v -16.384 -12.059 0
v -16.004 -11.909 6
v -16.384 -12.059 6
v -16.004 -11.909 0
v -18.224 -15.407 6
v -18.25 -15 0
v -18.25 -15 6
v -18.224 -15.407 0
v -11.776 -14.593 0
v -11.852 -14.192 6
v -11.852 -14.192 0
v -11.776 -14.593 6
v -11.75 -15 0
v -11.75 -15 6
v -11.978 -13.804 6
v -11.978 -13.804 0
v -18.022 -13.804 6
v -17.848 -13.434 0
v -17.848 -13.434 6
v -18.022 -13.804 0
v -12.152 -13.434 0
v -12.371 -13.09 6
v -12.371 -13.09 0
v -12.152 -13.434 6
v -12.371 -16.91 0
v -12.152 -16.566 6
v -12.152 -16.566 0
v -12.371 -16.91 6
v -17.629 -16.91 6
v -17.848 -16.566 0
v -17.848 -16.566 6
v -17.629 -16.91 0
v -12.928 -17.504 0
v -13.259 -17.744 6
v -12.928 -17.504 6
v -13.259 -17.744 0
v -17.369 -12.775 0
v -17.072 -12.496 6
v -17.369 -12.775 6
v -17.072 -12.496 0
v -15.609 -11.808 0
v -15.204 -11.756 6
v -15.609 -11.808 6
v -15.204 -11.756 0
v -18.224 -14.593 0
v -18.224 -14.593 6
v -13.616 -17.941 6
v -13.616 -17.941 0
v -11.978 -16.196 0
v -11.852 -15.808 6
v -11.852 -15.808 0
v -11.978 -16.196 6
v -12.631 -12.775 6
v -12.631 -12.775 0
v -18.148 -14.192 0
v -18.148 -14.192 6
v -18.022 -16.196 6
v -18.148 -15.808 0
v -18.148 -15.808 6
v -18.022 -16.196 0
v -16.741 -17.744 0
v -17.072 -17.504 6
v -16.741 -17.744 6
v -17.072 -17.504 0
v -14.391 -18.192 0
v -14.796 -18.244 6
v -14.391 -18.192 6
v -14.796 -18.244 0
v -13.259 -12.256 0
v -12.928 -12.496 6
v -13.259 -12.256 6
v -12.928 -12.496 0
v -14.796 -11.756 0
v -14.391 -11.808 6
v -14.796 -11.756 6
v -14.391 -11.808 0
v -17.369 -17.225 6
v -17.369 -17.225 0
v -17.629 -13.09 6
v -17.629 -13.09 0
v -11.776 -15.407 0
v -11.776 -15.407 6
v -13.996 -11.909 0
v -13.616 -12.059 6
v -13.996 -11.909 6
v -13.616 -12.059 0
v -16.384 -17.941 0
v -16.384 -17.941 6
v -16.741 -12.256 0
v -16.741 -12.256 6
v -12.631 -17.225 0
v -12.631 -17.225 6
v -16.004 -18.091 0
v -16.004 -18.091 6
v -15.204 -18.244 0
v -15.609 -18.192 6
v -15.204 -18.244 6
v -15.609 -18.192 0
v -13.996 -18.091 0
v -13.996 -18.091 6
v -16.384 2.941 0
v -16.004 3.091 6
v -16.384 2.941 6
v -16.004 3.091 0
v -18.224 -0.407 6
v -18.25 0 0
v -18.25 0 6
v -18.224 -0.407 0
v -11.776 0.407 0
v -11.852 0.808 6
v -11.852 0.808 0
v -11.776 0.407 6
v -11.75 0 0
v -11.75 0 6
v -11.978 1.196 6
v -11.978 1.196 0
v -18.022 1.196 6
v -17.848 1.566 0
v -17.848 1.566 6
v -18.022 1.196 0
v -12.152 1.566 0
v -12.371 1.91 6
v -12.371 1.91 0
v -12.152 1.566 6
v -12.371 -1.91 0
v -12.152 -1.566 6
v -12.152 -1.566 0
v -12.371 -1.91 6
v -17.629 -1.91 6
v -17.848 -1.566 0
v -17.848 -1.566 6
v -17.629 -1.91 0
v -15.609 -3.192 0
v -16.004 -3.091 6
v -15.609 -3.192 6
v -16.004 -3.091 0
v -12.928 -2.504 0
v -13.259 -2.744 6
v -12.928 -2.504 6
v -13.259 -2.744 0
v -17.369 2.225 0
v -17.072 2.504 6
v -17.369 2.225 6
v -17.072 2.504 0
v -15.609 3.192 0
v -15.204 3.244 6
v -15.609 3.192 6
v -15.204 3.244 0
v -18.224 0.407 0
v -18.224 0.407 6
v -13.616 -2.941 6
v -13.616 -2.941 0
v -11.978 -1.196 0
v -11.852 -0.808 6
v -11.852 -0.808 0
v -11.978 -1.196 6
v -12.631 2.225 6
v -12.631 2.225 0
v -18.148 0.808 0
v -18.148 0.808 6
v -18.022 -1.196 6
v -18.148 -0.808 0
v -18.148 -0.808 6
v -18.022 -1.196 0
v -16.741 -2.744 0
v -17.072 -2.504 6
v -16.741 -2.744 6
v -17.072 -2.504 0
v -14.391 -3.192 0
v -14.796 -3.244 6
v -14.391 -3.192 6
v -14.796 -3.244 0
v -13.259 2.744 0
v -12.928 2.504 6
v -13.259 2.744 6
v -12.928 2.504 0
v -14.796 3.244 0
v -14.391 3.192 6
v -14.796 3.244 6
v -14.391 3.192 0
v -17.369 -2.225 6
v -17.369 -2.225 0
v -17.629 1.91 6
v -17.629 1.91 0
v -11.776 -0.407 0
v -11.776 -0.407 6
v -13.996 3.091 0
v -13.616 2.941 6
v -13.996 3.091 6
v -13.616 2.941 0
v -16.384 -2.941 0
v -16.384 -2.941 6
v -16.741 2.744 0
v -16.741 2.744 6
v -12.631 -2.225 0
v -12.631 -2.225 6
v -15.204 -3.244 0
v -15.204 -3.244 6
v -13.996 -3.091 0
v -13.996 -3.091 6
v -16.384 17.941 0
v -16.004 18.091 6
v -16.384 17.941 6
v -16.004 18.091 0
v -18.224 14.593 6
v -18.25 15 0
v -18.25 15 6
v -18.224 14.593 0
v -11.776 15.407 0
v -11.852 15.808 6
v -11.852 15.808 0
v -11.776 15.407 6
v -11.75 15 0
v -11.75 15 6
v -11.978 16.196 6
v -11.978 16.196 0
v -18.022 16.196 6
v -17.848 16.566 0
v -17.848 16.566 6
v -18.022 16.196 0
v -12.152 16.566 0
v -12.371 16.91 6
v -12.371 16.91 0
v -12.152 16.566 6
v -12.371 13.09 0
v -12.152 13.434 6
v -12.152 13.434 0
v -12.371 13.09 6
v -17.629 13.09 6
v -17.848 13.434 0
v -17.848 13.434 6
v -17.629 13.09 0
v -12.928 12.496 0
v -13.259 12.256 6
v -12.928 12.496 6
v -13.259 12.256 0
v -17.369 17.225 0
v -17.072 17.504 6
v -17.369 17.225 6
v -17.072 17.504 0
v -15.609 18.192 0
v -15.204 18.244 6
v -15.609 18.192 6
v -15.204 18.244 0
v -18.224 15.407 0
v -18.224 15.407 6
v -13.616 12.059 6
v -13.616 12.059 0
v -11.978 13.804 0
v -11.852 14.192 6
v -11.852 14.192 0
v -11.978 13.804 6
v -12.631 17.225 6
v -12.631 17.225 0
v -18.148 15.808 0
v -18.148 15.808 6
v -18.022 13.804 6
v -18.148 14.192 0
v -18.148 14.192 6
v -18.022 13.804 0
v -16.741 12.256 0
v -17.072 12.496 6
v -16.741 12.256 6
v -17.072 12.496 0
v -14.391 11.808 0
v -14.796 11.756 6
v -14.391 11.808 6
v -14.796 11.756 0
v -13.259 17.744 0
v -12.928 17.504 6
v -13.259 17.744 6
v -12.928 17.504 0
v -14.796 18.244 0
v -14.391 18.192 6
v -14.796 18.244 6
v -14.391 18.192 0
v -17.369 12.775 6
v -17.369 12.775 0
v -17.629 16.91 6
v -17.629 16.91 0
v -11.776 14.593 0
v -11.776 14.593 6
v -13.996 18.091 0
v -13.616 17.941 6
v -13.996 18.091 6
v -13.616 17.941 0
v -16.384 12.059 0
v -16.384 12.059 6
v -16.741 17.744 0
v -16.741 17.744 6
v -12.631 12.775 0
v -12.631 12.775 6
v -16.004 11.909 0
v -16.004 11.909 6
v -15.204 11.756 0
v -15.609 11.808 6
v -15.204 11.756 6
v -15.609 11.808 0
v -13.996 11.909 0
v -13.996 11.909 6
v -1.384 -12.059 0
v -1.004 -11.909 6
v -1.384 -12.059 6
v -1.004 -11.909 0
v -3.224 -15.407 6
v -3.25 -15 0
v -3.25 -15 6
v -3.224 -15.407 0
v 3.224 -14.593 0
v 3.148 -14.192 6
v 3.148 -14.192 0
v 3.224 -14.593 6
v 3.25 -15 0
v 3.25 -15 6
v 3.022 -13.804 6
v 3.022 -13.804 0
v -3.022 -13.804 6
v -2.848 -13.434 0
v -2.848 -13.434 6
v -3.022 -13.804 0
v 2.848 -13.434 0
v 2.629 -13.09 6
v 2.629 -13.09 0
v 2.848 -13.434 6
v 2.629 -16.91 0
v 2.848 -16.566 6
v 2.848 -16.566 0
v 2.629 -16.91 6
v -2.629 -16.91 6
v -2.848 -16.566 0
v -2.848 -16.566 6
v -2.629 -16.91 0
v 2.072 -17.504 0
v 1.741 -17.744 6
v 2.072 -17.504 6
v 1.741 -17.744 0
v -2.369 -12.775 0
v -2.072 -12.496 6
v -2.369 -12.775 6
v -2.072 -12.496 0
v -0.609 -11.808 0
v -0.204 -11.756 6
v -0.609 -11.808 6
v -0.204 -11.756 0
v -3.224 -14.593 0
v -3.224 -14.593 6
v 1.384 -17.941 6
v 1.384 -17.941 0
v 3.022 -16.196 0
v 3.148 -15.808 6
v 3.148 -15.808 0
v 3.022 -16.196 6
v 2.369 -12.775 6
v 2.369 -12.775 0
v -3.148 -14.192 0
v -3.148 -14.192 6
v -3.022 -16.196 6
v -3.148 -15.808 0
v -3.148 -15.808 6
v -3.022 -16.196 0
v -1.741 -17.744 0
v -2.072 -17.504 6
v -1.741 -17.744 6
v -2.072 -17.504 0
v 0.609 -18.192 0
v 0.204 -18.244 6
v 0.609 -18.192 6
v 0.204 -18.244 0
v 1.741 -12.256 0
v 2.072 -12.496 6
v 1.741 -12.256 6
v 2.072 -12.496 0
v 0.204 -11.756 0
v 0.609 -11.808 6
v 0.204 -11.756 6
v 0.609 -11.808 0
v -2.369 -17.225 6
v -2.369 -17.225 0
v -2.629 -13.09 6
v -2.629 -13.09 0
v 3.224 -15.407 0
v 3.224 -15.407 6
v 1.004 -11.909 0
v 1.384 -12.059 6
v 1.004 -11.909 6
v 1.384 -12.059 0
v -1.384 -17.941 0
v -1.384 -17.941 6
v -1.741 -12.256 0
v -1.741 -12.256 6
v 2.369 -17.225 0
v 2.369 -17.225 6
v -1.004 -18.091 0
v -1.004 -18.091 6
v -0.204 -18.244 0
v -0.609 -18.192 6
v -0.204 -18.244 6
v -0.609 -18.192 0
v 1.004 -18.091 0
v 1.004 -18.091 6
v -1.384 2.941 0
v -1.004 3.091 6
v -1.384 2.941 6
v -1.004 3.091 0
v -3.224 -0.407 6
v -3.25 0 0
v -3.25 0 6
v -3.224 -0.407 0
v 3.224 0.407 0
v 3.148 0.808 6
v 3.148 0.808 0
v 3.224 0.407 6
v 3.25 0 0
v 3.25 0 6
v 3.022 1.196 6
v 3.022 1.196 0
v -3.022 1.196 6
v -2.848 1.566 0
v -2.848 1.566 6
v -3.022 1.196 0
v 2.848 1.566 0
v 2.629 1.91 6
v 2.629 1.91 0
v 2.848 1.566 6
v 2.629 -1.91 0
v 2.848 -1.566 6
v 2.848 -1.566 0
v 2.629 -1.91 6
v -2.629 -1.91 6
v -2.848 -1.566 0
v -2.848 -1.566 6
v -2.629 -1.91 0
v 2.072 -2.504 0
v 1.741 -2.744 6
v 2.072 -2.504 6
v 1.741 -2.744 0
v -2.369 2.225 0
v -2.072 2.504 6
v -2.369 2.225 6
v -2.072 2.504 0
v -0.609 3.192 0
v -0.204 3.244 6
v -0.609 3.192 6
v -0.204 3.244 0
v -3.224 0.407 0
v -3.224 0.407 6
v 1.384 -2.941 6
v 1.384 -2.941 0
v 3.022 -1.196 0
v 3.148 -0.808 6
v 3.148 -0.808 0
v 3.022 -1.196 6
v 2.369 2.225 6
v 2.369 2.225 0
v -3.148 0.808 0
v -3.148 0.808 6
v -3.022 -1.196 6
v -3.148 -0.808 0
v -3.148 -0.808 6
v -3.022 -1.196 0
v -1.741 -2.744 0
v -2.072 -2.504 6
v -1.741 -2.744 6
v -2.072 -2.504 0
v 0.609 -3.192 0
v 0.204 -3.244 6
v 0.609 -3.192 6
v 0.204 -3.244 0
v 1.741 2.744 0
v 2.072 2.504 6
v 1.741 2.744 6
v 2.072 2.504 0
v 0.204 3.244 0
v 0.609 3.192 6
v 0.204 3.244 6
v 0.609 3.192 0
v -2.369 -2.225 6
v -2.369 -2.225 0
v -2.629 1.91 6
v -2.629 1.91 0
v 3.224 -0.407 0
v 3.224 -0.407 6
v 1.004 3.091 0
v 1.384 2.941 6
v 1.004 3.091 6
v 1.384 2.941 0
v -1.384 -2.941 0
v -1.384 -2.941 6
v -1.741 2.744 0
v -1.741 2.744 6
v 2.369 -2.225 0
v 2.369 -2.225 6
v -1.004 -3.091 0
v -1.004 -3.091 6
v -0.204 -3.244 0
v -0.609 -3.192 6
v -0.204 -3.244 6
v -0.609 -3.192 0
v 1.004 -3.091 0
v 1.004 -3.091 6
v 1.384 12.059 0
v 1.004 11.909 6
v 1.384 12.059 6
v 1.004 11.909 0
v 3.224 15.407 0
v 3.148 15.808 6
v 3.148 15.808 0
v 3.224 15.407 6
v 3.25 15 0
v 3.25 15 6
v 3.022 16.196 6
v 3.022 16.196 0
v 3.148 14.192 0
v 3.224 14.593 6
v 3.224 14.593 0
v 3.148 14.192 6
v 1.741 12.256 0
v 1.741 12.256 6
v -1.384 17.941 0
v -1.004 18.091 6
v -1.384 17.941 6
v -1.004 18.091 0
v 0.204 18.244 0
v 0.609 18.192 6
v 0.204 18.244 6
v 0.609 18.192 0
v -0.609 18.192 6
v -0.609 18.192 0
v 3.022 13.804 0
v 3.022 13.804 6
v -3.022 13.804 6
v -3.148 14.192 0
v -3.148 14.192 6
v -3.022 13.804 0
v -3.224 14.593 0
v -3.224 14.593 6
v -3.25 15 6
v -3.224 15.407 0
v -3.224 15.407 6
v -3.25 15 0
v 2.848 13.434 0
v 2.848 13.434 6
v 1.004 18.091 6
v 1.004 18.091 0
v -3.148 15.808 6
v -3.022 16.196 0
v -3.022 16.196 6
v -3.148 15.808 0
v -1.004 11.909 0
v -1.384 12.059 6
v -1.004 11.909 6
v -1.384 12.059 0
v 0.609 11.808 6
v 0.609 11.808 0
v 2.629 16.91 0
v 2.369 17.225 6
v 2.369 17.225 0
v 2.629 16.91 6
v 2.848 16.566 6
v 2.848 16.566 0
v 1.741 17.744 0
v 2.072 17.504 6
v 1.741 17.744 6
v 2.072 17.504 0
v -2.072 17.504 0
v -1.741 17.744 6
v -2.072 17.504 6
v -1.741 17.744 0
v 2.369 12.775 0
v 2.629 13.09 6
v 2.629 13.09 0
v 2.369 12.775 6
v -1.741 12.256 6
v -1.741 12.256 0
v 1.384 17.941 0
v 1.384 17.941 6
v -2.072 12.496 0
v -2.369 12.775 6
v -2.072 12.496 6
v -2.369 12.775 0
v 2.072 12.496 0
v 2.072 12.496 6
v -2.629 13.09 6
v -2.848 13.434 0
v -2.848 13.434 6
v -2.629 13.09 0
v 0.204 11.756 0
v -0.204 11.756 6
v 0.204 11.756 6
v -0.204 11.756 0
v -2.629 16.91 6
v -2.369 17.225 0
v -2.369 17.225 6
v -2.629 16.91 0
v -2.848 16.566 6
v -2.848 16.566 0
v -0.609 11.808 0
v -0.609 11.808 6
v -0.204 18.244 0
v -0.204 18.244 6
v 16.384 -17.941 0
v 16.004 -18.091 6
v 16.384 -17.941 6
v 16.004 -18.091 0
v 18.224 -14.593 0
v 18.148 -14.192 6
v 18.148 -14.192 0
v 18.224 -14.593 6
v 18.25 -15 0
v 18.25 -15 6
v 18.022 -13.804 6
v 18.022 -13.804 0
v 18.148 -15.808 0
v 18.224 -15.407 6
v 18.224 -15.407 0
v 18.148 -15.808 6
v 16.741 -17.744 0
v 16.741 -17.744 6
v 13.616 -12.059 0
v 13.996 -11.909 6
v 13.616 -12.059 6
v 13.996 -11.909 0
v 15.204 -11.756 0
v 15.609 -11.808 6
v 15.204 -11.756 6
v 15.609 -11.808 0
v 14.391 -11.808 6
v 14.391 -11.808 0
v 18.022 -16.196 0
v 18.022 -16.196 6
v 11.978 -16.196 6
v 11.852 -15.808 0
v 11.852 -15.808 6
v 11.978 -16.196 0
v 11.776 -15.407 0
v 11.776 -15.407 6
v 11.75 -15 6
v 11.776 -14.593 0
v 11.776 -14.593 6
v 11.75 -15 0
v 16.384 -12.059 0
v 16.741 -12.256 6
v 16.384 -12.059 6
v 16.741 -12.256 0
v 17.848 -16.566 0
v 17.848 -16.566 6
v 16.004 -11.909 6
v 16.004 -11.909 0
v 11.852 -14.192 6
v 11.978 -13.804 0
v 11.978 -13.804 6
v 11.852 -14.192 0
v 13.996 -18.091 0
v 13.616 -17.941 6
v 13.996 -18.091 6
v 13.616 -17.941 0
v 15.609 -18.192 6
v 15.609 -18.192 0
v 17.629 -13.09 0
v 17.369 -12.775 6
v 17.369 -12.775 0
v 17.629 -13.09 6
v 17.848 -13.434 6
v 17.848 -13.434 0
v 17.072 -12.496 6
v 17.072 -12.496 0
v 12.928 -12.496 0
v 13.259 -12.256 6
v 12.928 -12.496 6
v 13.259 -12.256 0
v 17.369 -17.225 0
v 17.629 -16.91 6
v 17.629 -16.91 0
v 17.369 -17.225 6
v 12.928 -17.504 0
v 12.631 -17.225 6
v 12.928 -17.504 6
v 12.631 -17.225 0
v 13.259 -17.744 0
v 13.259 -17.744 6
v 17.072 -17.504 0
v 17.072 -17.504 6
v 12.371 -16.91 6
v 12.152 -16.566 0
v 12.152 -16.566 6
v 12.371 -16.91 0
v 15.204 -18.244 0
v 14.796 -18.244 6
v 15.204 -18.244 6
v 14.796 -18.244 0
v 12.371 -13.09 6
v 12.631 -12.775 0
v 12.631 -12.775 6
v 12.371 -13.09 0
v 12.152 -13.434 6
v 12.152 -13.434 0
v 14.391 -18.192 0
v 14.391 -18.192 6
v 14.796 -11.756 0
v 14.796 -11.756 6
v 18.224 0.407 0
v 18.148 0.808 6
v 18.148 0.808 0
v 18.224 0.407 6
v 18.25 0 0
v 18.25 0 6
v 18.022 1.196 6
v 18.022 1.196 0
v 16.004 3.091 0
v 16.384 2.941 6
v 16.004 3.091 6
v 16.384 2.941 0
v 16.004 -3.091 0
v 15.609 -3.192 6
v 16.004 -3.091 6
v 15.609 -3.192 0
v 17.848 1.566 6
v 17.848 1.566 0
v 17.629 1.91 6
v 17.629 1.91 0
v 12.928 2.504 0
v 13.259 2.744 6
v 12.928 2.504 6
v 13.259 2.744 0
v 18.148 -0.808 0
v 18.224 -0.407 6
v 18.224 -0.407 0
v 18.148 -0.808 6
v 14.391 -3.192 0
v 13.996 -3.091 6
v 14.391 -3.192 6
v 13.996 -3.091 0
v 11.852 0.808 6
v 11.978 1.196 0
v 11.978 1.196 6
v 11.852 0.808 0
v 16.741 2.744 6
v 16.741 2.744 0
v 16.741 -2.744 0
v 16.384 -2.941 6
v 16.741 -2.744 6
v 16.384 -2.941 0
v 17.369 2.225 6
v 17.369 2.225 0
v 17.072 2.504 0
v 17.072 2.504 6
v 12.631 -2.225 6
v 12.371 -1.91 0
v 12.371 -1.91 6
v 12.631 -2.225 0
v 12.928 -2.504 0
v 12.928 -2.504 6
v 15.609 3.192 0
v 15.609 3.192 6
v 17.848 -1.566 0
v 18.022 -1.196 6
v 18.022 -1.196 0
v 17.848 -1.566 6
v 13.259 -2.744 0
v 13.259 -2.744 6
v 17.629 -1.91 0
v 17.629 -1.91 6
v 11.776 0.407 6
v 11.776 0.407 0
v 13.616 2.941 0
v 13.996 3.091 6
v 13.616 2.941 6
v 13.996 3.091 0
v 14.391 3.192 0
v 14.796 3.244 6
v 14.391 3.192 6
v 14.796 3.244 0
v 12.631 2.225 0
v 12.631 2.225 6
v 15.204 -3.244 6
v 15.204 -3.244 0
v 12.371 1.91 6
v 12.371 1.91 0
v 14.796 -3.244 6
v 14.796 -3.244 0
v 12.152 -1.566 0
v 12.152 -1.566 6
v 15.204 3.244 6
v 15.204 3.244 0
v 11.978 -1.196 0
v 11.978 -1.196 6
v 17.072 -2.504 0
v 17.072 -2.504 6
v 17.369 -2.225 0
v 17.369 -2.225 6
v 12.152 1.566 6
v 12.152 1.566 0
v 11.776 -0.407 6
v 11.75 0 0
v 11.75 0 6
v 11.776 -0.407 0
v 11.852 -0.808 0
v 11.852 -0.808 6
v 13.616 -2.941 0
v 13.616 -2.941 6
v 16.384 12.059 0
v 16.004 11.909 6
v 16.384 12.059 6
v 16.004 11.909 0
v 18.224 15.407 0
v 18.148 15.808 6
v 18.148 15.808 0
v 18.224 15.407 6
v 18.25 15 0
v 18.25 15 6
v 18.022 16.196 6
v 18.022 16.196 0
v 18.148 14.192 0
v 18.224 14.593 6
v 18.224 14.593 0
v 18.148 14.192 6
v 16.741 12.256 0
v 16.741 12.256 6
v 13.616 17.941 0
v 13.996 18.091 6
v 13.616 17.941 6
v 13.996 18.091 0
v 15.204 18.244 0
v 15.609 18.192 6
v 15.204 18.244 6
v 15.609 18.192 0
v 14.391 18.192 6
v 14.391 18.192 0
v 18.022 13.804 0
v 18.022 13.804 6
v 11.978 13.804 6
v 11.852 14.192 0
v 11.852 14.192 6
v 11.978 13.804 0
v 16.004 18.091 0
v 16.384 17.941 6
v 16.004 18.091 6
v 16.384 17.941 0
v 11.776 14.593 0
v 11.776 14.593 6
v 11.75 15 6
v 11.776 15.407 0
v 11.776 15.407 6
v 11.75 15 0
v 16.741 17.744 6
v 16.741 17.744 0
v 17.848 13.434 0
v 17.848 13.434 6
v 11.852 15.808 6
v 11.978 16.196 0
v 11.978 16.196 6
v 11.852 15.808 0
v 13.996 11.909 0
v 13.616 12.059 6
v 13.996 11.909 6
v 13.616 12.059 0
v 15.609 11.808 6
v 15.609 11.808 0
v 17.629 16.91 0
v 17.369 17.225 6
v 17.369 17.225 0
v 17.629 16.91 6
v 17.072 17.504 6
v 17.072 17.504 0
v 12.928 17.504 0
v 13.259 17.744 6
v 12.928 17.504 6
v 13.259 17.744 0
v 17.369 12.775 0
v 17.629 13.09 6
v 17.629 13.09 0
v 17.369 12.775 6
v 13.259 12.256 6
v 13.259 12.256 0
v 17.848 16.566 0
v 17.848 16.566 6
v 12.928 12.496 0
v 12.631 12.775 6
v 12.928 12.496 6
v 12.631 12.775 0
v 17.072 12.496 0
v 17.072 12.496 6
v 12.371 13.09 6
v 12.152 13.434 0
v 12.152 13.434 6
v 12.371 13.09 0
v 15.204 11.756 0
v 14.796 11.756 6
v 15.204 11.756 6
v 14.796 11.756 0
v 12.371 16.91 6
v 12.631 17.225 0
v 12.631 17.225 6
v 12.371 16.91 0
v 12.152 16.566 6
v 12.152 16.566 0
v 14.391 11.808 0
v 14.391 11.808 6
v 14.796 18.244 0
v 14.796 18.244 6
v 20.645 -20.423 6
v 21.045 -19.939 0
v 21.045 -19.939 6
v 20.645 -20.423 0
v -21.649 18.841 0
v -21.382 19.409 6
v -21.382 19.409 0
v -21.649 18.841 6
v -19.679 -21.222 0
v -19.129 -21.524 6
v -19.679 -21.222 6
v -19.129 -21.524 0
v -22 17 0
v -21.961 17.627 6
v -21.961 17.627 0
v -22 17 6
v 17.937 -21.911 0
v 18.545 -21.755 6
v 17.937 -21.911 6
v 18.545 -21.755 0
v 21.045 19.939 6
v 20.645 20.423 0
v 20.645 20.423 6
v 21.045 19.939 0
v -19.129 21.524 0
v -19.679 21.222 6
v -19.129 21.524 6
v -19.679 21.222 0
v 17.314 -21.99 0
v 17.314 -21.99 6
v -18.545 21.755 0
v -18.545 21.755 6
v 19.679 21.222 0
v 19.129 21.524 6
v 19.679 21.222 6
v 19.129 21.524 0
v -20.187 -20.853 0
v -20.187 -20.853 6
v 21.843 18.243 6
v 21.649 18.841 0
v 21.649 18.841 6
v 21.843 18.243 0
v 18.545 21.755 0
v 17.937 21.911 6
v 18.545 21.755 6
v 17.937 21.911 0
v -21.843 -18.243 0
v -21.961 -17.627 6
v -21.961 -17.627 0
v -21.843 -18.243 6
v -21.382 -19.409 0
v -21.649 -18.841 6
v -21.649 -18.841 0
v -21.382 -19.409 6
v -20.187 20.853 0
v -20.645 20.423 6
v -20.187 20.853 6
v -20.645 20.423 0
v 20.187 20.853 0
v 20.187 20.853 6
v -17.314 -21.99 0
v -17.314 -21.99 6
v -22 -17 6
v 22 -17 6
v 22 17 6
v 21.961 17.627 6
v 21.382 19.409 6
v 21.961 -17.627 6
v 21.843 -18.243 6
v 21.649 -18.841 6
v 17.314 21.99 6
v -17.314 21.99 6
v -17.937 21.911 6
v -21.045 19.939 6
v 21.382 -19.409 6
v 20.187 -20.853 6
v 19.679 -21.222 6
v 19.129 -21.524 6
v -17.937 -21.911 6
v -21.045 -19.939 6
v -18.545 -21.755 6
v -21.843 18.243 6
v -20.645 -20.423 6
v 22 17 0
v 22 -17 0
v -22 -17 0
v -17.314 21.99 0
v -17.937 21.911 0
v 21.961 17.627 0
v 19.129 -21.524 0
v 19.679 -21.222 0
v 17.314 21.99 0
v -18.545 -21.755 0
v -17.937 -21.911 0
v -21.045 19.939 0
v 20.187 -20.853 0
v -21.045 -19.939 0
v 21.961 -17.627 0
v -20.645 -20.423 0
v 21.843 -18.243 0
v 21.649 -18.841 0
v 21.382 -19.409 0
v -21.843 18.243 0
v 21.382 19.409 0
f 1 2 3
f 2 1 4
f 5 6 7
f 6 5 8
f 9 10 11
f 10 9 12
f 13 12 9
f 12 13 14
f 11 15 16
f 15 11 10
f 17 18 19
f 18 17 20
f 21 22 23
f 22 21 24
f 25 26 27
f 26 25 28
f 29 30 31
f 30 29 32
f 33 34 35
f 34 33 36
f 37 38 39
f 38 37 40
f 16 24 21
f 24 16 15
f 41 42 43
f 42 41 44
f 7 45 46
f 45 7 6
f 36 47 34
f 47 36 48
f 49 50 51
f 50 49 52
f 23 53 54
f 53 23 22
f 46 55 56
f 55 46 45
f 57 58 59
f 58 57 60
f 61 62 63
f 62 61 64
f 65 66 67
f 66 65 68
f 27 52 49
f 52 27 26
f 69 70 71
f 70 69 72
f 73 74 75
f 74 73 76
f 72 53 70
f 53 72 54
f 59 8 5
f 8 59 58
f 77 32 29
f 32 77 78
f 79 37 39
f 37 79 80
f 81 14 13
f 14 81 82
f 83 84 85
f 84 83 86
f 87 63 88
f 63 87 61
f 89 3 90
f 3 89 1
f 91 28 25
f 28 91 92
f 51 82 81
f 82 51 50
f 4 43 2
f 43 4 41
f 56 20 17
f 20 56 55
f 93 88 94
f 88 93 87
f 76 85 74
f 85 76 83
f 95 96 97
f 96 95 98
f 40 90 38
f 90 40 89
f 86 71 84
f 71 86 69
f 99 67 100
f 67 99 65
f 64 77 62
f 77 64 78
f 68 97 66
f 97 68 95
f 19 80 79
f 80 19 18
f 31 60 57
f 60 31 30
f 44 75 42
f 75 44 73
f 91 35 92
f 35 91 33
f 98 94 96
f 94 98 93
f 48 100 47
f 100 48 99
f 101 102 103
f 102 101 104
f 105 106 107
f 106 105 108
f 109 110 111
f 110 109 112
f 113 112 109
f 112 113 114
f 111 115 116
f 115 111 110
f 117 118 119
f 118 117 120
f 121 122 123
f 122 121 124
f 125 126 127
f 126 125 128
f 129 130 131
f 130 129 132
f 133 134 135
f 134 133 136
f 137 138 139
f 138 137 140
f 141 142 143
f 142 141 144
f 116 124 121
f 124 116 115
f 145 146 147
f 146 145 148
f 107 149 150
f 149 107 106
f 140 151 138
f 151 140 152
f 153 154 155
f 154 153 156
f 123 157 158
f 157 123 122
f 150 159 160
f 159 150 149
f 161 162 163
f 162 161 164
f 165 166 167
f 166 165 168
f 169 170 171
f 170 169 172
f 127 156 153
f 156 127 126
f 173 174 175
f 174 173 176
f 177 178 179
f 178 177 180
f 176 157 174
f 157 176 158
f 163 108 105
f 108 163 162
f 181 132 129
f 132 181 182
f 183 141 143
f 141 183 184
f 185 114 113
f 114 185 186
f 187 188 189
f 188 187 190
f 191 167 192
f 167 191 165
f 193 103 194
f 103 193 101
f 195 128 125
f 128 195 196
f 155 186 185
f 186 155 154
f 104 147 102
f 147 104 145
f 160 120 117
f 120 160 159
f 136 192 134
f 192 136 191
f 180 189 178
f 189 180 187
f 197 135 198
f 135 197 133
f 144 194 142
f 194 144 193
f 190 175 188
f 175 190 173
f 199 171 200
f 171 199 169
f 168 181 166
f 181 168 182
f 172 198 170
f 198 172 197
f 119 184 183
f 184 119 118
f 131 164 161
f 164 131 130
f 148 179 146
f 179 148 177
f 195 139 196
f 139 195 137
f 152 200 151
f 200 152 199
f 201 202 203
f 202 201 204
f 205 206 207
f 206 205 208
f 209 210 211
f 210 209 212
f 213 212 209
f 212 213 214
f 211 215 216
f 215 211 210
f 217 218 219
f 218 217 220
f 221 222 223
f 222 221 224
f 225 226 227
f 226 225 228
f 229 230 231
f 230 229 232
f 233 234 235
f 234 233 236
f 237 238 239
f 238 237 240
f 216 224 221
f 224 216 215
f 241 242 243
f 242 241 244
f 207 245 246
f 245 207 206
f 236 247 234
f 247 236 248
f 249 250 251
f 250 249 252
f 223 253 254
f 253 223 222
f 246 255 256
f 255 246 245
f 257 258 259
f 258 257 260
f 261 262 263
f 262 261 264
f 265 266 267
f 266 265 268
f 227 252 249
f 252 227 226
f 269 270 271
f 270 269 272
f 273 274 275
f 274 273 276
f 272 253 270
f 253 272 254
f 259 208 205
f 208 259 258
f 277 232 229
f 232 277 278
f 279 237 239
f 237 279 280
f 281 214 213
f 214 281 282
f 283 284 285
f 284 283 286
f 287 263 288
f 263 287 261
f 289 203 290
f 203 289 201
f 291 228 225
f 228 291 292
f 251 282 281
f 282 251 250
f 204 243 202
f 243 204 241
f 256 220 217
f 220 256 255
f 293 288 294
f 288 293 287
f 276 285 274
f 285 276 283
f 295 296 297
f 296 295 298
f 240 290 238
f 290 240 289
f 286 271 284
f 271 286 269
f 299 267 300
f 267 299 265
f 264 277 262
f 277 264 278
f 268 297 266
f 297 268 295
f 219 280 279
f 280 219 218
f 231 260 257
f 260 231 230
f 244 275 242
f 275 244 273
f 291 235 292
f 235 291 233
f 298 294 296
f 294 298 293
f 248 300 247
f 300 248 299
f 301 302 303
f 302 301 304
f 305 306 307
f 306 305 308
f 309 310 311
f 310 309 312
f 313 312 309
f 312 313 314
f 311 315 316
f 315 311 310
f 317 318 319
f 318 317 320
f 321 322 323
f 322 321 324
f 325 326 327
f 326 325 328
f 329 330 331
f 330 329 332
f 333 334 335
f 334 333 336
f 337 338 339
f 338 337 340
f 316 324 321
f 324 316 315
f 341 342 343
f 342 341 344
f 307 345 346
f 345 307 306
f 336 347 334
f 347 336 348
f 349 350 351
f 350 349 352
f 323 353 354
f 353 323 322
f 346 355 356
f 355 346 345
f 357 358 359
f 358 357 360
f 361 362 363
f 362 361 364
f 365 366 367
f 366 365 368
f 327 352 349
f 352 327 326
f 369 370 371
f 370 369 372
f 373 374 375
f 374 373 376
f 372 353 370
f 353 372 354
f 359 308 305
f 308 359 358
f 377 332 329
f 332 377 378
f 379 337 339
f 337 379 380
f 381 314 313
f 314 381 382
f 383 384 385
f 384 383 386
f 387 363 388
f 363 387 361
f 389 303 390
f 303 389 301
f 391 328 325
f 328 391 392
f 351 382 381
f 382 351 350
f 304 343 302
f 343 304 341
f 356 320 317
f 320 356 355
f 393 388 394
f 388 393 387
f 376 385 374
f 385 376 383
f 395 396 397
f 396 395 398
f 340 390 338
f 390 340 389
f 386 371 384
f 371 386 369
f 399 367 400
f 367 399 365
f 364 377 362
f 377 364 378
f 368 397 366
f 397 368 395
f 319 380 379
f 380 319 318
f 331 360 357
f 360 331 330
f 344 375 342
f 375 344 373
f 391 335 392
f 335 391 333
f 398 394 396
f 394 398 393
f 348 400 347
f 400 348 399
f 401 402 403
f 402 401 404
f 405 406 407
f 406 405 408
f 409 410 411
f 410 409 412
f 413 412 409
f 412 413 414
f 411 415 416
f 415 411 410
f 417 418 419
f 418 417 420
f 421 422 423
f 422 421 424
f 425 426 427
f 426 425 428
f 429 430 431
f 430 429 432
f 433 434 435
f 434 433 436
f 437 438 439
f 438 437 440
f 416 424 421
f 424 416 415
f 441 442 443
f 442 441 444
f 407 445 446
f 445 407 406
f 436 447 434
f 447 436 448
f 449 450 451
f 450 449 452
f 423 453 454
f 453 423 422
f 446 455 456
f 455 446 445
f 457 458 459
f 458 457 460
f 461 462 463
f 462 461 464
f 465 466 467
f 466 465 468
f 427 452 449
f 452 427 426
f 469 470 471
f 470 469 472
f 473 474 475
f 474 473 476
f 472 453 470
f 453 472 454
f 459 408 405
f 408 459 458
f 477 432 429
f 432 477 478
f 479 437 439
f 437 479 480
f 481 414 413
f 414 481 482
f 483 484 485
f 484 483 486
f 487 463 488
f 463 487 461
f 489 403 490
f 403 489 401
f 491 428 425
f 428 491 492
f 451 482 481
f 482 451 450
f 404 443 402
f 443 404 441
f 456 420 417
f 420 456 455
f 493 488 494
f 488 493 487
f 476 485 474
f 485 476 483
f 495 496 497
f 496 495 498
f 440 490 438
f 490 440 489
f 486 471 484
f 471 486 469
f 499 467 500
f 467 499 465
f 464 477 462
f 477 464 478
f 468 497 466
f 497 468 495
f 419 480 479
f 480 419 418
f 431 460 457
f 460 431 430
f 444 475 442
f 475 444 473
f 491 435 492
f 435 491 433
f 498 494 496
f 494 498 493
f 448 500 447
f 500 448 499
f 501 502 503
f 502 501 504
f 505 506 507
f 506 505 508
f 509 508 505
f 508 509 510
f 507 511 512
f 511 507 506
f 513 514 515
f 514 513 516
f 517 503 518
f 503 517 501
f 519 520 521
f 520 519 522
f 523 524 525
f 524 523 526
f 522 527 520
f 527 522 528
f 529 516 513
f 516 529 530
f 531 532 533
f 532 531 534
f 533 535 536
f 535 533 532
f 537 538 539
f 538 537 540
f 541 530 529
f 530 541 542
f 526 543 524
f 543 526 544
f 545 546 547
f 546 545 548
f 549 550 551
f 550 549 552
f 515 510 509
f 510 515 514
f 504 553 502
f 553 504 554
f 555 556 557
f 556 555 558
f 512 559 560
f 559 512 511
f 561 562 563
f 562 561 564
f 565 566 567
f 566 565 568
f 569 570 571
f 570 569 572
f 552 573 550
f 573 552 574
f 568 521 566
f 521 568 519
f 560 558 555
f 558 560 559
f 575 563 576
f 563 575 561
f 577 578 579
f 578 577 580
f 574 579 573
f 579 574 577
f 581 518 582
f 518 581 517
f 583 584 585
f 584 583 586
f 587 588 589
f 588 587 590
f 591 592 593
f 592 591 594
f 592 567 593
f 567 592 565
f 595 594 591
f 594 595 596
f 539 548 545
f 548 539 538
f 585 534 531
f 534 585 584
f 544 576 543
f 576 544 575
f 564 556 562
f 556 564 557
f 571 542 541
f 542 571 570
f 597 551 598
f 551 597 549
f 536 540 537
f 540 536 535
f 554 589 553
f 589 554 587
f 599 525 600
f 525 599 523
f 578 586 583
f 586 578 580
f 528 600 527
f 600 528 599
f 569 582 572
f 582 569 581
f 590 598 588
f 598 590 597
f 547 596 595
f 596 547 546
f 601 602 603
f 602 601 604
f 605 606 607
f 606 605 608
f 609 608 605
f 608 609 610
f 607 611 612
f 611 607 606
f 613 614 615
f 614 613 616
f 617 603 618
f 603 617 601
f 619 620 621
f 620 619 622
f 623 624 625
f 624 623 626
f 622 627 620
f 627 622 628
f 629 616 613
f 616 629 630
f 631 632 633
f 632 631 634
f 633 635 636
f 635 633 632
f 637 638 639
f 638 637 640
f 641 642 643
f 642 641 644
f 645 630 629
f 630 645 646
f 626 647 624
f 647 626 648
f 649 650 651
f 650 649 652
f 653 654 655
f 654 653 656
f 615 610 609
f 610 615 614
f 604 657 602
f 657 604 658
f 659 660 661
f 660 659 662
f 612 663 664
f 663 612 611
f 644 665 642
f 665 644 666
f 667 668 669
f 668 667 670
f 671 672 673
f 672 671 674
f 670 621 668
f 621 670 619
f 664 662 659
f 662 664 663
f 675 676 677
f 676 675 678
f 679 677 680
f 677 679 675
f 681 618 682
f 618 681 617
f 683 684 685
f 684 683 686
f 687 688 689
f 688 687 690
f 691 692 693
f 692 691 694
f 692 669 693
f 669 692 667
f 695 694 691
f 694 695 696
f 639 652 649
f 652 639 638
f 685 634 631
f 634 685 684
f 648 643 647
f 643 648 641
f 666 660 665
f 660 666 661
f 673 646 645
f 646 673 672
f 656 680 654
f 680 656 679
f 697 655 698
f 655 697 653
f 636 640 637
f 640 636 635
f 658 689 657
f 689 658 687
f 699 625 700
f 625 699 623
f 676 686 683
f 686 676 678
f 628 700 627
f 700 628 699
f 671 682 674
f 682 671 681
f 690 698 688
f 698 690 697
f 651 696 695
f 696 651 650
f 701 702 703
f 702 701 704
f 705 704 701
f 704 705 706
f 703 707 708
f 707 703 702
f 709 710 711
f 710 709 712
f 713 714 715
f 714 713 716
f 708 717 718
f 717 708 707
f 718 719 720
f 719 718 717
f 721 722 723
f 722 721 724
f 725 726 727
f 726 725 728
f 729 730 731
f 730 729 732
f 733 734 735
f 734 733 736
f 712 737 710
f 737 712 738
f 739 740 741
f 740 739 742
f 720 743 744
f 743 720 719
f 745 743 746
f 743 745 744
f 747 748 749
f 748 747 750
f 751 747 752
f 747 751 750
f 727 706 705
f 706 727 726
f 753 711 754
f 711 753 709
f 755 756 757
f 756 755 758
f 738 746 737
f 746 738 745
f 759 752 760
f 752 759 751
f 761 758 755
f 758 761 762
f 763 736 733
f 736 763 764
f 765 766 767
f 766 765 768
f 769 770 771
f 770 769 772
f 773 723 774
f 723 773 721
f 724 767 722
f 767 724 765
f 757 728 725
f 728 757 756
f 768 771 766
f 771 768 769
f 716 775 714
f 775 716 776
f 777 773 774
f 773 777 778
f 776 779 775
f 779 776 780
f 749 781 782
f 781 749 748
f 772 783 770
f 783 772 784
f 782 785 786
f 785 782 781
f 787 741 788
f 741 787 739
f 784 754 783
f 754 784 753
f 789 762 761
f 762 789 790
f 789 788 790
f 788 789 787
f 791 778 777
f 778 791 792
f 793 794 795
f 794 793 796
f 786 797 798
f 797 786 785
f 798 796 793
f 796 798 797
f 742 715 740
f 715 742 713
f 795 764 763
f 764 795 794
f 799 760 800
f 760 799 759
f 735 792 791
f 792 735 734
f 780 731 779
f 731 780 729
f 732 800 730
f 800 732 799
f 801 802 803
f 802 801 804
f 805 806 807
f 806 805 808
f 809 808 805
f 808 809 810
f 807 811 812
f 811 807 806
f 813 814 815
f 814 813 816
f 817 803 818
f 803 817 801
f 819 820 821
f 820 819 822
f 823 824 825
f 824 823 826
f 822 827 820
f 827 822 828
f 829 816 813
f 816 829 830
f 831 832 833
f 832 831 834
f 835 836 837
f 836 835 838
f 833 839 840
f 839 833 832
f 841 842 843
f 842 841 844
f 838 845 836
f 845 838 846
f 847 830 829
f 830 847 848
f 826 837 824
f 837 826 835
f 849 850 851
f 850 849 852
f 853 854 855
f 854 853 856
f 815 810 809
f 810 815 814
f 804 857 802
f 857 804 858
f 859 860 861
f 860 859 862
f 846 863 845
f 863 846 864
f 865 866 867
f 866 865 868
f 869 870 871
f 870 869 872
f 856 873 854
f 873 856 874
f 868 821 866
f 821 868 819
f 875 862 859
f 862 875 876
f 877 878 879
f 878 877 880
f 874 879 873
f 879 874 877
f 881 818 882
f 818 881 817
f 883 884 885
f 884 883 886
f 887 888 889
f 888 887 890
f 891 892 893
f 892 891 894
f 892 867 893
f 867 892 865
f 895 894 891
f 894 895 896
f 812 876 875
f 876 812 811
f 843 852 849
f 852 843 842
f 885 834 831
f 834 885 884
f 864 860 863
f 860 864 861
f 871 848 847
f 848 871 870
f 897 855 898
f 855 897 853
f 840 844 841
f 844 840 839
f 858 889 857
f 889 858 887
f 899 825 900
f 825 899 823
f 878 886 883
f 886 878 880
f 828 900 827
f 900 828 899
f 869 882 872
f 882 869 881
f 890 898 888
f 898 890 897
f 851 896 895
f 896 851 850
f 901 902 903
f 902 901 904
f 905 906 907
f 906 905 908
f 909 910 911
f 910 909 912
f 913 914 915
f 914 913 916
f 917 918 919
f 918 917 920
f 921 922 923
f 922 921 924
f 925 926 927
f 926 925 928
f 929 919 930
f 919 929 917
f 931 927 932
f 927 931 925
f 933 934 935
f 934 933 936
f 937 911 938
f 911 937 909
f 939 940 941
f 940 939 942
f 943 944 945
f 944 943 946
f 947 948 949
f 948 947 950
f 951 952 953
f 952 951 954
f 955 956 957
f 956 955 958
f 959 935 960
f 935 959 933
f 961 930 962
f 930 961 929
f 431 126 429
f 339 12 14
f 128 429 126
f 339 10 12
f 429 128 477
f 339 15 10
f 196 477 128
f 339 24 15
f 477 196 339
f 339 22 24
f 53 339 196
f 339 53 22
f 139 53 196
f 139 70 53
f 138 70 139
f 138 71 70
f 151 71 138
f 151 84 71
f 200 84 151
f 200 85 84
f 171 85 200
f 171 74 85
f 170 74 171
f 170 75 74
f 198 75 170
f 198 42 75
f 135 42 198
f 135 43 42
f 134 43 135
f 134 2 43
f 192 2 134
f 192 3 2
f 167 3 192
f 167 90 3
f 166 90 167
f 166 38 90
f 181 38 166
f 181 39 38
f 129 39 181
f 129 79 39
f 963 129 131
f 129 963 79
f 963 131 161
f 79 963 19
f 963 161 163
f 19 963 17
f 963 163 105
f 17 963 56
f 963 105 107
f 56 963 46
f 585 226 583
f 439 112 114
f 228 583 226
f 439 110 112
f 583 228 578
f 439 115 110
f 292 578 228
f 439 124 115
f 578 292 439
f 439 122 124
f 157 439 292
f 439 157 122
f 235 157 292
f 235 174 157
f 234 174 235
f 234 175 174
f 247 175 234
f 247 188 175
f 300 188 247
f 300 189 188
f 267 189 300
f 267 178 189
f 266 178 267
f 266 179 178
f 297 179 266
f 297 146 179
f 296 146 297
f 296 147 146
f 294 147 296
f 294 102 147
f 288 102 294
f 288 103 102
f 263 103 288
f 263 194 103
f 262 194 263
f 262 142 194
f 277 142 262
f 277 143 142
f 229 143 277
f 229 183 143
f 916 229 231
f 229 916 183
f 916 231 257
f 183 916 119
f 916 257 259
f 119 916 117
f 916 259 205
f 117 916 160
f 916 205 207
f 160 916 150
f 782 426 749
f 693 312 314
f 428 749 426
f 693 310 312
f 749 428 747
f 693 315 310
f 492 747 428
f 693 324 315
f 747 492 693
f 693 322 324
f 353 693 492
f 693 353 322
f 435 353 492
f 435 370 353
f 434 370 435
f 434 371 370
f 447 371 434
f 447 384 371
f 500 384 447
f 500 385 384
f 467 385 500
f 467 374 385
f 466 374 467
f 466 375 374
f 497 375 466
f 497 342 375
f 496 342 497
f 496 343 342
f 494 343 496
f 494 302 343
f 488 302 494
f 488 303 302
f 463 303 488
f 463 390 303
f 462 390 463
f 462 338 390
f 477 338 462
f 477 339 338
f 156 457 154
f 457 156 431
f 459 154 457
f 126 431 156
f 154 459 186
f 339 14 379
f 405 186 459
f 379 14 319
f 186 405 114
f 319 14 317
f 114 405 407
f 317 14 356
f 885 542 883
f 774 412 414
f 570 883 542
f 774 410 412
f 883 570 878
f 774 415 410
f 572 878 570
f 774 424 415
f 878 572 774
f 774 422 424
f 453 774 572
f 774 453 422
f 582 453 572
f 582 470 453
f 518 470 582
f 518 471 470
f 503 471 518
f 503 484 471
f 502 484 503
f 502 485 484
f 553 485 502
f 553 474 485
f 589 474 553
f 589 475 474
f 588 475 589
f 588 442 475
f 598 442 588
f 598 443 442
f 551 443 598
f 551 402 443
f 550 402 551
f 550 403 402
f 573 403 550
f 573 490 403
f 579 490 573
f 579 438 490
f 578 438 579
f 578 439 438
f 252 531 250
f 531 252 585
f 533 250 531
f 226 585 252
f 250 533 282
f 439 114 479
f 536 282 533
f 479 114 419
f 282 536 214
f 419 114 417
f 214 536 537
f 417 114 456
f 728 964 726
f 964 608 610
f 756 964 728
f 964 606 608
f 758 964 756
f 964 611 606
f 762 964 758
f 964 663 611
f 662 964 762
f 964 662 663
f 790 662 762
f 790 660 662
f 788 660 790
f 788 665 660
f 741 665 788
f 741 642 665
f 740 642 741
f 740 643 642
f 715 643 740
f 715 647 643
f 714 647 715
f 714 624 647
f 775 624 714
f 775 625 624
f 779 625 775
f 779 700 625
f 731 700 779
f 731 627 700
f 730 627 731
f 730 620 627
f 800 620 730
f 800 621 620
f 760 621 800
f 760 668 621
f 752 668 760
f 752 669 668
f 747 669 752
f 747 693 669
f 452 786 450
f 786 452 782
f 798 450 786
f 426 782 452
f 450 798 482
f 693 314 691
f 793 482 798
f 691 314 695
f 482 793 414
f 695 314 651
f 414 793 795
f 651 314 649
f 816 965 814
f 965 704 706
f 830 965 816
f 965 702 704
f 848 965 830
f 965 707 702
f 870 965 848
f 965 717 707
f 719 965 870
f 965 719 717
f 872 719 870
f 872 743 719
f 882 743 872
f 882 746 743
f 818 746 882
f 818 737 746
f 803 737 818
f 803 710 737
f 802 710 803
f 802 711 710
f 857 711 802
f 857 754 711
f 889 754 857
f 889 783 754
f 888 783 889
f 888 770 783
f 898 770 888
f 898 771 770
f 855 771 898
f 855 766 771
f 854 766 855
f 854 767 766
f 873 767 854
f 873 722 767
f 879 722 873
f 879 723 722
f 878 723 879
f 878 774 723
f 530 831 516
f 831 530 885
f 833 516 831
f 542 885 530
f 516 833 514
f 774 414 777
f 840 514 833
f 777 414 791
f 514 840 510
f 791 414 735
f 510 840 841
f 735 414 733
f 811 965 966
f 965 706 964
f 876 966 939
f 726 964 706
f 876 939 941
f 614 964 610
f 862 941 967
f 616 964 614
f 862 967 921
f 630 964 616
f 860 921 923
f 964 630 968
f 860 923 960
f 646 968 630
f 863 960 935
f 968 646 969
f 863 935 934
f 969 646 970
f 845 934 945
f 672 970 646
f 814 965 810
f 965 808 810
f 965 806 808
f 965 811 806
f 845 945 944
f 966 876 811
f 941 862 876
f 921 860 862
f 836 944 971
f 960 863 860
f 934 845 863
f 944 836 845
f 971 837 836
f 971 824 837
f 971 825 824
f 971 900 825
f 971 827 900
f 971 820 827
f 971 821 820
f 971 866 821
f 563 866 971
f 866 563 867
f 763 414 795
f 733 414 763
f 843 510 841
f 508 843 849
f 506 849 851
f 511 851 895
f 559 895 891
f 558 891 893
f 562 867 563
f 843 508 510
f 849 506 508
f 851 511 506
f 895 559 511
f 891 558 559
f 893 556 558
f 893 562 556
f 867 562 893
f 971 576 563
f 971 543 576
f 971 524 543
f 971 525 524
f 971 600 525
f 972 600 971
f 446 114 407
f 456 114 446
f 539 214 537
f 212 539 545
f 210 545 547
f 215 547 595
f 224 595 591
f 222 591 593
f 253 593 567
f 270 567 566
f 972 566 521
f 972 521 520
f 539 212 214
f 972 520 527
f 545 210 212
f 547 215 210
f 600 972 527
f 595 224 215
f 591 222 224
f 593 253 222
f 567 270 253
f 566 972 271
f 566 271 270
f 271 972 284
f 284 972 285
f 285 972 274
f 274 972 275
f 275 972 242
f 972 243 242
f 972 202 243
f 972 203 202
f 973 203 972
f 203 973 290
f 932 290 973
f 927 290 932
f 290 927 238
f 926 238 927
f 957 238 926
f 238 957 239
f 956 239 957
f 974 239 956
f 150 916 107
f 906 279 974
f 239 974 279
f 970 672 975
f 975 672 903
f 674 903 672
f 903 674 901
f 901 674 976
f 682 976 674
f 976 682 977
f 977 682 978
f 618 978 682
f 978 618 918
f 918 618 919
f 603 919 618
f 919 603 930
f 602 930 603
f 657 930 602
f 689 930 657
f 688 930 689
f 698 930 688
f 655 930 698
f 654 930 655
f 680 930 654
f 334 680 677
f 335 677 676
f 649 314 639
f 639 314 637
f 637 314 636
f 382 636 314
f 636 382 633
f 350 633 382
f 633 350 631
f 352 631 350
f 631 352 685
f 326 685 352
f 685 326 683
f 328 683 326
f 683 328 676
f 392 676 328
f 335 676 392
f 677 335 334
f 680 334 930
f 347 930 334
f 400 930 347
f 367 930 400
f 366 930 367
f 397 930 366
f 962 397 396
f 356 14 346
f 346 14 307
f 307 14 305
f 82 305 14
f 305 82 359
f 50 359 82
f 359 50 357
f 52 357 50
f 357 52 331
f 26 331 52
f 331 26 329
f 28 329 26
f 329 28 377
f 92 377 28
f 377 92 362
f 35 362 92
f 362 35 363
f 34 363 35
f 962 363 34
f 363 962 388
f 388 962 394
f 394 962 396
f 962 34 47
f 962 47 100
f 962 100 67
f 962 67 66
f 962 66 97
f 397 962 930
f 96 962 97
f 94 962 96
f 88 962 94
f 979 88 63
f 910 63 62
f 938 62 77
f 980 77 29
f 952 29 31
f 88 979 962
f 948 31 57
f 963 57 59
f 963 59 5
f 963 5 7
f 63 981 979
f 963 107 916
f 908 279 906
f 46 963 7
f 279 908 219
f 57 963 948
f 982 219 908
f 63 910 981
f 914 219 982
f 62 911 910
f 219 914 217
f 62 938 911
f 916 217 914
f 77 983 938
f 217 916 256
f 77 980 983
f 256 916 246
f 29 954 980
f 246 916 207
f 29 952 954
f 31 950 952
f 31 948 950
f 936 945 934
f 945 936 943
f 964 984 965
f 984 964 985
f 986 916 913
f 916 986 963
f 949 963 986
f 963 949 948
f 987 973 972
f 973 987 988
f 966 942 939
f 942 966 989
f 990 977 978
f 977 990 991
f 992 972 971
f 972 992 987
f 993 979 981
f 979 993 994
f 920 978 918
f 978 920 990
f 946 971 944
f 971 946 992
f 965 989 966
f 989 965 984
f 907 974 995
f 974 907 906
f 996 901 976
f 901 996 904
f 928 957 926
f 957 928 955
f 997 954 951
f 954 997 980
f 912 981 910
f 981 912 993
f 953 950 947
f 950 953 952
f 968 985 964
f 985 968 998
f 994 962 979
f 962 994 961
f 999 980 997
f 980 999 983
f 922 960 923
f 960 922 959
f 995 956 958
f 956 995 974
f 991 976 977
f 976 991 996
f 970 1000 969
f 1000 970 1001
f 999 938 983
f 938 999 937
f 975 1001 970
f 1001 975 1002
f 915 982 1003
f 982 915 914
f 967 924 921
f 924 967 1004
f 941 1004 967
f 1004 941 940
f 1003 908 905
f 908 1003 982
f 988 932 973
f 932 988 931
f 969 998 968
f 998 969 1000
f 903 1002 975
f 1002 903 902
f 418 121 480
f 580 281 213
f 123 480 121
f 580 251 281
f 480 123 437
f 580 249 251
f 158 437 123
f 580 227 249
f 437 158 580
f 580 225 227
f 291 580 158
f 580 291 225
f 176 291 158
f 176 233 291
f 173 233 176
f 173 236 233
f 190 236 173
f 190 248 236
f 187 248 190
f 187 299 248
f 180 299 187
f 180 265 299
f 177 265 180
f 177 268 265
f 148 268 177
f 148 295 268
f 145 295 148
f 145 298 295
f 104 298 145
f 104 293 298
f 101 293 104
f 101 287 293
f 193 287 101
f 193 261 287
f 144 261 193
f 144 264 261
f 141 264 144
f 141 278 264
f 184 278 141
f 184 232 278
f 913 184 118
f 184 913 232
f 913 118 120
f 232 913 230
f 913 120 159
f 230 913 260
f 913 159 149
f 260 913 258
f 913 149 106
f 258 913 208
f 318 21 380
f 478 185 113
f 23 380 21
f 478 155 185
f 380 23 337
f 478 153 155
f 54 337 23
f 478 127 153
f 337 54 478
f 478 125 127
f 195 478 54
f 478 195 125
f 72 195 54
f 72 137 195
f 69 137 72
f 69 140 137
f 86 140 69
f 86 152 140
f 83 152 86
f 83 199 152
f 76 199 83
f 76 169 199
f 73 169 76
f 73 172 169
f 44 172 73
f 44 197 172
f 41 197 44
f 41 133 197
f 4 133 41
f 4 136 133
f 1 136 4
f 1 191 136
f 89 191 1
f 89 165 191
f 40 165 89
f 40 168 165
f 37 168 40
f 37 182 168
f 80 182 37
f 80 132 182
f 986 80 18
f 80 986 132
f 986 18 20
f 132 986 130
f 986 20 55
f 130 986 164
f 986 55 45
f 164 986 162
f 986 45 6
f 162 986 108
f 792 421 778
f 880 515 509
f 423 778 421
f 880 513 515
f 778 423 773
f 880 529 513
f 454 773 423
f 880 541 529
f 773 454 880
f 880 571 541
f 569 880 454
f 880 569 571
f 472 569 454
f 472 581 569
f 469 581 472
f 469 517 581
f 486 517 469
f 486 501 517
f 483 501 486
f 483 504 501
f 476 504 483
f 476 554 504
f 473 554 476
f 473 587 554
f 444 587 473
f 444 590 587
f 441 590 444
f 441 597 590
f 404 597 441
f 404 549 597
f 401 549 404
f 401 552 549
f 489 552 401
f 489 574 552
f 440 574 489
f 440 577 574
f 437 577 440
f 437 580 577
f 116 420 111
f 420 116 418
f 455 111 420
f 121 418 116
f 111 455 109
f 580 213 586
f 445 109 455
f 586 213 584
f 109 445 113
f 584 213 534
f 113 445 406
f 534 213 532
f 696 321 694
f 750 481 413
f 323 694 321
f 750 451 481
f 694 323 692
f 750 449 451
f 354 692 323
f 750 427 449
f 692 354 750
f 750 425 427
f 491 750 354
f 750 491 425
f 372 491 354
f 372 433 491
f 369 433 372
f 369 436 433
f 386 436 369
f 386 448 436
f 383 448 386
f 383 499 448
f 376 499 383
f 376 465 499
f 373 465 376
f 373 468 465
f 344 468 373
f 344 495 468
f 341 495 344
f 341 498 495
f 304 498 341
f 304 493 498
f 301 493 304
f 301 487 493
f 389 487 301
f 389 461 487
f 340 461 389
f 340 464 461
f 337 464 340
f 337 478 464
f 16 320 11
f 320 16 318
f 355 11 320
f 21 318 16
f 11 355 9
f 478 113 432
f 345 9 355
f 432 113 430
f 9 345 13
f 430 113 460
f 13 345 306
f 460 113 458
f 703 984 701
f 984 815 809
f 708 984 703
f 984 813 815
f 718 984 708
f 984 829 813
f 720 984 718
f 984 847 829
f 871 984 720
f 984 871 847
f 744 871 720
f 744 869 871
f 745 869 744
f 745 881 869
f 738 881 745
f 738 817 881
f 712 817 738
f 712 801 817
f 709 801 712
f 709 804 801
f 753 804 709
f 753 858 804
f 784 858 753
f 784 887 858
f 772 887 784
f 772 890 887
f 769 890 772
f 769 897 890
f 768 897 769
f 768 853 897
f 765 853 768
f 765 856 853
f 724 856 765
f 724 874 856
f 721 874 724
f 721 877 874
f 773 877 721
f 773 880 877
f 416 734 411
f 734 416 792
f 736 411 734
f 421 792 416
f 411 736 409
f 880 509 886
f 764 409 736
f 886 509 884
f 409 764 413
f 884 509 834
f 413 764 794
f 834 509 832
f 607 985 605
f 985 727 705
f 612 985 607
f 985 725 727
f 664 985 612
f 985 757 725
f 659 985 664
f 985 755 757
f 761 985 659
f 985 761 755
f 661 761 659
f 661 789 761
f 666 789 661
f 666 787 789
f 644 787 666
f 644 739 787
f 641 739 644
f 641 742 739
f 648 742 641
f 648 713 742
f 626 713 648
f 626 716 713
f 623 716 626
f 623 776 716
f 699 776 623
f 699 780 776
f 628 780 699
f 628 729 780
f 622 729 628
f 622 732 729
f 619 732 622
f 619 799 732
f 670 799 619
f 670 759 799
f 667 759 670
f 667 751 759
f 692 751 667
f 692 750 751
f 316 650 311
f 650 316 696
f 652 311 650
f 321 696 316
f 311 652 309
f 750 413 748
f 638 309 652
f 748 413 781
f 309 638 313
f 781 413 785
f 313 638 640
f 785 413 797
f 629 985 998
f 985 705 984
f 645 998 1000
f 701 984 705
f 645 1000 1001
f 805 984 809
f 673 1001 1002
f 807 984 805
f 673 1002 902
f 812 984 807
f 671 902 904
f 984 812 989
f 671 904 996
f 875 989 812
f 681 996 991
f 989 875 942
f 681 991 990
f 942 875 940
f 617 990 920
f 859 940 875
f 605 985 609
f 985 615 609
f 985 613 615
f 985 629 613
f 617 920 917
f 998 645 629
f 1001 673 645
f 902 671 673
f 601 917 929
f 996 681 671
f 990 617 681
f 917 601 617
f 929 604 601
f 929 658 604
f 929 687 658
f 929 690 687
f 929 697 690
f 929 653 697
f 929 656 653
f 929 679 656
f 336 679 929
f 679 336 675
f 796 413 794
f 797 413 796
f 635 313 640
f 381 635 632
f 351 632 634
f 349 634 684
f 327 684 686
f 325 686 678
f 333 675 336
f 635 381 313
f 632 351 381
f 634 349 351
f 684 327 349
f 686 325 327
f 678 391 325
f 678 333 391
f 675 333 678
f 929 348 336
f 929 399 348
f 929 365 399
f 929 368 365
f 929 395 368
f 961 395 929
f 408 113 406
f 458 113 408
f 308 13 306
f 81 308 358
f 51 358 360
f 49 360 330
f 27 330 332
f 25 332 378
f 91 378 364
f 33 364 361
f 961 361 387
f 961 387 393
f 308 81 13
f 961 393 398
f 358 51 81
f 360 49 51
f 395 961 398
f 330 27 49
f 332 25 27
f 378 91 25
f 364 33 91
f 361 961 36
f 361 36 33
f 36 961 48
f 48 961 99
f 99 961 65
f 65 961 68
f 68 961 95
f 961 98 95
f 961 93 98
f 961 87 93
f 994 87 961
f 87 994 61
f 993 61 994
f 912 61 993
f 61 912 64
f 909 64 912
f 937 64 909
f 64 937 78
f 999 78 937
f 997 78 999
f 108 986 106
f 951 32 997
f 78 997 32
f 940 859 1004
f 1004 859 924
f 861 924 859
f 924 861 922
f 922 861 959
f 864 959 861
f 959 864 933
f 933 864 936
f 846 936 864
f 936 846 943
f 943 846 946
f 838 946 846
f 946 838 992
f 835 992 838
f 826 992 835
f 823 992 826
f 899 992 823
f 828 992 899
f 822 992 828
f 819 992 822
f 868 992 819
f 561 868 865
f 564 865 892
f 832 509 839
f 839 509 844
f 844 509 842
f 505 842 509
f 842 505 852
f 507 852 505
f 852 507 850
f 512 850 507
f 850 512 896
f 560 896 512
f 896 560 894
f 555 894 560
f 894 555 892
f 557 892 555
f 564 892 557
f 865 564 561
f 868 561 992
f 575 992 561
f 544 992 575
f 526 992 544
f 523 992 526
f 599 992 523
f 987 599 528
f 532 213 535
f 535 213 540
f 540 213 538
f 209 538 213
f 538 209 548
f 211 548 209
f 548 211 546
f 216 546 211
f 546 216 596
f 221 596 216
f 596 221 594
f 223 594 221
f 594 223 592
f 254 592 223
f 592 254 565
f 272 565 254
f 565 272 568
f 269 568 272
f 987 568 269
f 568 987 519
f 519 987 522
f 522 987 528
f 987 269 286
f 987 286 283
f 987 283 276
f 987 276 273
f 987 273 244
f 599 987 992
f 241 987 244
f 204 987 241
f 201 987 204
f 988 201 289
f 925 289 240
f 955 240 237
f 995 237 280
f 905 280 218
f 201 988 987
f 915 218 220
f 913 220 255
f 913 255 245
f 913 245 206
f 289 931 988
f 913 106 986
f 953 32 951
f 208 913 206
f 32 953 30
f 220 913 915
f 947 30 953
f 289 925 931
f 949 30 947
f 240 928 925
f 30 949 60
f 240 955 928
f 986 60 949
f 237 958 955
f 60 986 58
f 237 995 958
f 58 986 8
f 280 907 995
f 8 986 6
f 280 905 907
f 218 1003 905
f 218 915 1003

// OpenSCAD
$fn = 50;


difference() {
	union() {
		hull() {
			translate(v = [-17.0000000000, 17.0000000000, 0]) {
				cylinder(h = 6, r = 5);
			}
			translate(v = [17.0000000000, 17.0000000000, 0]) {
				cylinder(h = 6, r = 5);
			}
			translate(v = [-17.0000000000, -17.0000000000, 0]) {
				cylinder(h = 6, r = 5);
			}
			translate(v = [17.0000000000, -17.0000000000, 0]) {
				cylinder(h = 6, r = 5);
			}
		}
	}
	union() {
		translate(v = [-15.0000000000, -15.0000000000, 0]) {
			translate(v = [0, 0, -100]) {
				cylinder(h = 200, r = 3.2500000000);
			}
		}
		translate(v = [-15.0000000000, 0.0000000000, 0]) {
			translate(v = [0, 0, -100]) {
				cylinder(h = 200, r = 3.2500000000);
			}
		}
		translate(v = [-15.0000000000, 15.0000000000, 0]) {
			translate(v = [0, 0, -100]) {
				cylinder(h = 200, r = 3.2500000000);
			}
		}
		translate(v = [0.0000000000, -15.0000000000, 0]) {
			translate(v = [0, 0, -100]) {
				cylinder(h = 200, r = 3.2500000000);
			}
		}
		translate(v = [0, 0, -100]) {
			cylinder(h = 200, r = 3.2500000000);
		}
		translate(v = [0.0000000000, 15.0000000000, 0]) {
			translate(v = [0, 0, -100]) {
				cylinder(h = 200, r = 3.2500000000);
			}
		}
		translate(v = [15.0000000000, -15.0000000000, 0]) {
			translate(v = [0, 0, -100]) {
				cylinder(h = 200, r = 3.2500000000);
			}
		}
		translate(v = [15.0000000000, 0.0000000000, 0]) {
			translate(v = [0, 0, -100]) {
				cylinder(h = 200, r = 3.2500000000);
			}
		}
		translate(v = [15.0000000000, 15.0000000000, 0]) {
			translate(v = [0, 0, -100]) {
				cylinder(h = 200, r = 3.2500000000);
			}
		}
	}
}
